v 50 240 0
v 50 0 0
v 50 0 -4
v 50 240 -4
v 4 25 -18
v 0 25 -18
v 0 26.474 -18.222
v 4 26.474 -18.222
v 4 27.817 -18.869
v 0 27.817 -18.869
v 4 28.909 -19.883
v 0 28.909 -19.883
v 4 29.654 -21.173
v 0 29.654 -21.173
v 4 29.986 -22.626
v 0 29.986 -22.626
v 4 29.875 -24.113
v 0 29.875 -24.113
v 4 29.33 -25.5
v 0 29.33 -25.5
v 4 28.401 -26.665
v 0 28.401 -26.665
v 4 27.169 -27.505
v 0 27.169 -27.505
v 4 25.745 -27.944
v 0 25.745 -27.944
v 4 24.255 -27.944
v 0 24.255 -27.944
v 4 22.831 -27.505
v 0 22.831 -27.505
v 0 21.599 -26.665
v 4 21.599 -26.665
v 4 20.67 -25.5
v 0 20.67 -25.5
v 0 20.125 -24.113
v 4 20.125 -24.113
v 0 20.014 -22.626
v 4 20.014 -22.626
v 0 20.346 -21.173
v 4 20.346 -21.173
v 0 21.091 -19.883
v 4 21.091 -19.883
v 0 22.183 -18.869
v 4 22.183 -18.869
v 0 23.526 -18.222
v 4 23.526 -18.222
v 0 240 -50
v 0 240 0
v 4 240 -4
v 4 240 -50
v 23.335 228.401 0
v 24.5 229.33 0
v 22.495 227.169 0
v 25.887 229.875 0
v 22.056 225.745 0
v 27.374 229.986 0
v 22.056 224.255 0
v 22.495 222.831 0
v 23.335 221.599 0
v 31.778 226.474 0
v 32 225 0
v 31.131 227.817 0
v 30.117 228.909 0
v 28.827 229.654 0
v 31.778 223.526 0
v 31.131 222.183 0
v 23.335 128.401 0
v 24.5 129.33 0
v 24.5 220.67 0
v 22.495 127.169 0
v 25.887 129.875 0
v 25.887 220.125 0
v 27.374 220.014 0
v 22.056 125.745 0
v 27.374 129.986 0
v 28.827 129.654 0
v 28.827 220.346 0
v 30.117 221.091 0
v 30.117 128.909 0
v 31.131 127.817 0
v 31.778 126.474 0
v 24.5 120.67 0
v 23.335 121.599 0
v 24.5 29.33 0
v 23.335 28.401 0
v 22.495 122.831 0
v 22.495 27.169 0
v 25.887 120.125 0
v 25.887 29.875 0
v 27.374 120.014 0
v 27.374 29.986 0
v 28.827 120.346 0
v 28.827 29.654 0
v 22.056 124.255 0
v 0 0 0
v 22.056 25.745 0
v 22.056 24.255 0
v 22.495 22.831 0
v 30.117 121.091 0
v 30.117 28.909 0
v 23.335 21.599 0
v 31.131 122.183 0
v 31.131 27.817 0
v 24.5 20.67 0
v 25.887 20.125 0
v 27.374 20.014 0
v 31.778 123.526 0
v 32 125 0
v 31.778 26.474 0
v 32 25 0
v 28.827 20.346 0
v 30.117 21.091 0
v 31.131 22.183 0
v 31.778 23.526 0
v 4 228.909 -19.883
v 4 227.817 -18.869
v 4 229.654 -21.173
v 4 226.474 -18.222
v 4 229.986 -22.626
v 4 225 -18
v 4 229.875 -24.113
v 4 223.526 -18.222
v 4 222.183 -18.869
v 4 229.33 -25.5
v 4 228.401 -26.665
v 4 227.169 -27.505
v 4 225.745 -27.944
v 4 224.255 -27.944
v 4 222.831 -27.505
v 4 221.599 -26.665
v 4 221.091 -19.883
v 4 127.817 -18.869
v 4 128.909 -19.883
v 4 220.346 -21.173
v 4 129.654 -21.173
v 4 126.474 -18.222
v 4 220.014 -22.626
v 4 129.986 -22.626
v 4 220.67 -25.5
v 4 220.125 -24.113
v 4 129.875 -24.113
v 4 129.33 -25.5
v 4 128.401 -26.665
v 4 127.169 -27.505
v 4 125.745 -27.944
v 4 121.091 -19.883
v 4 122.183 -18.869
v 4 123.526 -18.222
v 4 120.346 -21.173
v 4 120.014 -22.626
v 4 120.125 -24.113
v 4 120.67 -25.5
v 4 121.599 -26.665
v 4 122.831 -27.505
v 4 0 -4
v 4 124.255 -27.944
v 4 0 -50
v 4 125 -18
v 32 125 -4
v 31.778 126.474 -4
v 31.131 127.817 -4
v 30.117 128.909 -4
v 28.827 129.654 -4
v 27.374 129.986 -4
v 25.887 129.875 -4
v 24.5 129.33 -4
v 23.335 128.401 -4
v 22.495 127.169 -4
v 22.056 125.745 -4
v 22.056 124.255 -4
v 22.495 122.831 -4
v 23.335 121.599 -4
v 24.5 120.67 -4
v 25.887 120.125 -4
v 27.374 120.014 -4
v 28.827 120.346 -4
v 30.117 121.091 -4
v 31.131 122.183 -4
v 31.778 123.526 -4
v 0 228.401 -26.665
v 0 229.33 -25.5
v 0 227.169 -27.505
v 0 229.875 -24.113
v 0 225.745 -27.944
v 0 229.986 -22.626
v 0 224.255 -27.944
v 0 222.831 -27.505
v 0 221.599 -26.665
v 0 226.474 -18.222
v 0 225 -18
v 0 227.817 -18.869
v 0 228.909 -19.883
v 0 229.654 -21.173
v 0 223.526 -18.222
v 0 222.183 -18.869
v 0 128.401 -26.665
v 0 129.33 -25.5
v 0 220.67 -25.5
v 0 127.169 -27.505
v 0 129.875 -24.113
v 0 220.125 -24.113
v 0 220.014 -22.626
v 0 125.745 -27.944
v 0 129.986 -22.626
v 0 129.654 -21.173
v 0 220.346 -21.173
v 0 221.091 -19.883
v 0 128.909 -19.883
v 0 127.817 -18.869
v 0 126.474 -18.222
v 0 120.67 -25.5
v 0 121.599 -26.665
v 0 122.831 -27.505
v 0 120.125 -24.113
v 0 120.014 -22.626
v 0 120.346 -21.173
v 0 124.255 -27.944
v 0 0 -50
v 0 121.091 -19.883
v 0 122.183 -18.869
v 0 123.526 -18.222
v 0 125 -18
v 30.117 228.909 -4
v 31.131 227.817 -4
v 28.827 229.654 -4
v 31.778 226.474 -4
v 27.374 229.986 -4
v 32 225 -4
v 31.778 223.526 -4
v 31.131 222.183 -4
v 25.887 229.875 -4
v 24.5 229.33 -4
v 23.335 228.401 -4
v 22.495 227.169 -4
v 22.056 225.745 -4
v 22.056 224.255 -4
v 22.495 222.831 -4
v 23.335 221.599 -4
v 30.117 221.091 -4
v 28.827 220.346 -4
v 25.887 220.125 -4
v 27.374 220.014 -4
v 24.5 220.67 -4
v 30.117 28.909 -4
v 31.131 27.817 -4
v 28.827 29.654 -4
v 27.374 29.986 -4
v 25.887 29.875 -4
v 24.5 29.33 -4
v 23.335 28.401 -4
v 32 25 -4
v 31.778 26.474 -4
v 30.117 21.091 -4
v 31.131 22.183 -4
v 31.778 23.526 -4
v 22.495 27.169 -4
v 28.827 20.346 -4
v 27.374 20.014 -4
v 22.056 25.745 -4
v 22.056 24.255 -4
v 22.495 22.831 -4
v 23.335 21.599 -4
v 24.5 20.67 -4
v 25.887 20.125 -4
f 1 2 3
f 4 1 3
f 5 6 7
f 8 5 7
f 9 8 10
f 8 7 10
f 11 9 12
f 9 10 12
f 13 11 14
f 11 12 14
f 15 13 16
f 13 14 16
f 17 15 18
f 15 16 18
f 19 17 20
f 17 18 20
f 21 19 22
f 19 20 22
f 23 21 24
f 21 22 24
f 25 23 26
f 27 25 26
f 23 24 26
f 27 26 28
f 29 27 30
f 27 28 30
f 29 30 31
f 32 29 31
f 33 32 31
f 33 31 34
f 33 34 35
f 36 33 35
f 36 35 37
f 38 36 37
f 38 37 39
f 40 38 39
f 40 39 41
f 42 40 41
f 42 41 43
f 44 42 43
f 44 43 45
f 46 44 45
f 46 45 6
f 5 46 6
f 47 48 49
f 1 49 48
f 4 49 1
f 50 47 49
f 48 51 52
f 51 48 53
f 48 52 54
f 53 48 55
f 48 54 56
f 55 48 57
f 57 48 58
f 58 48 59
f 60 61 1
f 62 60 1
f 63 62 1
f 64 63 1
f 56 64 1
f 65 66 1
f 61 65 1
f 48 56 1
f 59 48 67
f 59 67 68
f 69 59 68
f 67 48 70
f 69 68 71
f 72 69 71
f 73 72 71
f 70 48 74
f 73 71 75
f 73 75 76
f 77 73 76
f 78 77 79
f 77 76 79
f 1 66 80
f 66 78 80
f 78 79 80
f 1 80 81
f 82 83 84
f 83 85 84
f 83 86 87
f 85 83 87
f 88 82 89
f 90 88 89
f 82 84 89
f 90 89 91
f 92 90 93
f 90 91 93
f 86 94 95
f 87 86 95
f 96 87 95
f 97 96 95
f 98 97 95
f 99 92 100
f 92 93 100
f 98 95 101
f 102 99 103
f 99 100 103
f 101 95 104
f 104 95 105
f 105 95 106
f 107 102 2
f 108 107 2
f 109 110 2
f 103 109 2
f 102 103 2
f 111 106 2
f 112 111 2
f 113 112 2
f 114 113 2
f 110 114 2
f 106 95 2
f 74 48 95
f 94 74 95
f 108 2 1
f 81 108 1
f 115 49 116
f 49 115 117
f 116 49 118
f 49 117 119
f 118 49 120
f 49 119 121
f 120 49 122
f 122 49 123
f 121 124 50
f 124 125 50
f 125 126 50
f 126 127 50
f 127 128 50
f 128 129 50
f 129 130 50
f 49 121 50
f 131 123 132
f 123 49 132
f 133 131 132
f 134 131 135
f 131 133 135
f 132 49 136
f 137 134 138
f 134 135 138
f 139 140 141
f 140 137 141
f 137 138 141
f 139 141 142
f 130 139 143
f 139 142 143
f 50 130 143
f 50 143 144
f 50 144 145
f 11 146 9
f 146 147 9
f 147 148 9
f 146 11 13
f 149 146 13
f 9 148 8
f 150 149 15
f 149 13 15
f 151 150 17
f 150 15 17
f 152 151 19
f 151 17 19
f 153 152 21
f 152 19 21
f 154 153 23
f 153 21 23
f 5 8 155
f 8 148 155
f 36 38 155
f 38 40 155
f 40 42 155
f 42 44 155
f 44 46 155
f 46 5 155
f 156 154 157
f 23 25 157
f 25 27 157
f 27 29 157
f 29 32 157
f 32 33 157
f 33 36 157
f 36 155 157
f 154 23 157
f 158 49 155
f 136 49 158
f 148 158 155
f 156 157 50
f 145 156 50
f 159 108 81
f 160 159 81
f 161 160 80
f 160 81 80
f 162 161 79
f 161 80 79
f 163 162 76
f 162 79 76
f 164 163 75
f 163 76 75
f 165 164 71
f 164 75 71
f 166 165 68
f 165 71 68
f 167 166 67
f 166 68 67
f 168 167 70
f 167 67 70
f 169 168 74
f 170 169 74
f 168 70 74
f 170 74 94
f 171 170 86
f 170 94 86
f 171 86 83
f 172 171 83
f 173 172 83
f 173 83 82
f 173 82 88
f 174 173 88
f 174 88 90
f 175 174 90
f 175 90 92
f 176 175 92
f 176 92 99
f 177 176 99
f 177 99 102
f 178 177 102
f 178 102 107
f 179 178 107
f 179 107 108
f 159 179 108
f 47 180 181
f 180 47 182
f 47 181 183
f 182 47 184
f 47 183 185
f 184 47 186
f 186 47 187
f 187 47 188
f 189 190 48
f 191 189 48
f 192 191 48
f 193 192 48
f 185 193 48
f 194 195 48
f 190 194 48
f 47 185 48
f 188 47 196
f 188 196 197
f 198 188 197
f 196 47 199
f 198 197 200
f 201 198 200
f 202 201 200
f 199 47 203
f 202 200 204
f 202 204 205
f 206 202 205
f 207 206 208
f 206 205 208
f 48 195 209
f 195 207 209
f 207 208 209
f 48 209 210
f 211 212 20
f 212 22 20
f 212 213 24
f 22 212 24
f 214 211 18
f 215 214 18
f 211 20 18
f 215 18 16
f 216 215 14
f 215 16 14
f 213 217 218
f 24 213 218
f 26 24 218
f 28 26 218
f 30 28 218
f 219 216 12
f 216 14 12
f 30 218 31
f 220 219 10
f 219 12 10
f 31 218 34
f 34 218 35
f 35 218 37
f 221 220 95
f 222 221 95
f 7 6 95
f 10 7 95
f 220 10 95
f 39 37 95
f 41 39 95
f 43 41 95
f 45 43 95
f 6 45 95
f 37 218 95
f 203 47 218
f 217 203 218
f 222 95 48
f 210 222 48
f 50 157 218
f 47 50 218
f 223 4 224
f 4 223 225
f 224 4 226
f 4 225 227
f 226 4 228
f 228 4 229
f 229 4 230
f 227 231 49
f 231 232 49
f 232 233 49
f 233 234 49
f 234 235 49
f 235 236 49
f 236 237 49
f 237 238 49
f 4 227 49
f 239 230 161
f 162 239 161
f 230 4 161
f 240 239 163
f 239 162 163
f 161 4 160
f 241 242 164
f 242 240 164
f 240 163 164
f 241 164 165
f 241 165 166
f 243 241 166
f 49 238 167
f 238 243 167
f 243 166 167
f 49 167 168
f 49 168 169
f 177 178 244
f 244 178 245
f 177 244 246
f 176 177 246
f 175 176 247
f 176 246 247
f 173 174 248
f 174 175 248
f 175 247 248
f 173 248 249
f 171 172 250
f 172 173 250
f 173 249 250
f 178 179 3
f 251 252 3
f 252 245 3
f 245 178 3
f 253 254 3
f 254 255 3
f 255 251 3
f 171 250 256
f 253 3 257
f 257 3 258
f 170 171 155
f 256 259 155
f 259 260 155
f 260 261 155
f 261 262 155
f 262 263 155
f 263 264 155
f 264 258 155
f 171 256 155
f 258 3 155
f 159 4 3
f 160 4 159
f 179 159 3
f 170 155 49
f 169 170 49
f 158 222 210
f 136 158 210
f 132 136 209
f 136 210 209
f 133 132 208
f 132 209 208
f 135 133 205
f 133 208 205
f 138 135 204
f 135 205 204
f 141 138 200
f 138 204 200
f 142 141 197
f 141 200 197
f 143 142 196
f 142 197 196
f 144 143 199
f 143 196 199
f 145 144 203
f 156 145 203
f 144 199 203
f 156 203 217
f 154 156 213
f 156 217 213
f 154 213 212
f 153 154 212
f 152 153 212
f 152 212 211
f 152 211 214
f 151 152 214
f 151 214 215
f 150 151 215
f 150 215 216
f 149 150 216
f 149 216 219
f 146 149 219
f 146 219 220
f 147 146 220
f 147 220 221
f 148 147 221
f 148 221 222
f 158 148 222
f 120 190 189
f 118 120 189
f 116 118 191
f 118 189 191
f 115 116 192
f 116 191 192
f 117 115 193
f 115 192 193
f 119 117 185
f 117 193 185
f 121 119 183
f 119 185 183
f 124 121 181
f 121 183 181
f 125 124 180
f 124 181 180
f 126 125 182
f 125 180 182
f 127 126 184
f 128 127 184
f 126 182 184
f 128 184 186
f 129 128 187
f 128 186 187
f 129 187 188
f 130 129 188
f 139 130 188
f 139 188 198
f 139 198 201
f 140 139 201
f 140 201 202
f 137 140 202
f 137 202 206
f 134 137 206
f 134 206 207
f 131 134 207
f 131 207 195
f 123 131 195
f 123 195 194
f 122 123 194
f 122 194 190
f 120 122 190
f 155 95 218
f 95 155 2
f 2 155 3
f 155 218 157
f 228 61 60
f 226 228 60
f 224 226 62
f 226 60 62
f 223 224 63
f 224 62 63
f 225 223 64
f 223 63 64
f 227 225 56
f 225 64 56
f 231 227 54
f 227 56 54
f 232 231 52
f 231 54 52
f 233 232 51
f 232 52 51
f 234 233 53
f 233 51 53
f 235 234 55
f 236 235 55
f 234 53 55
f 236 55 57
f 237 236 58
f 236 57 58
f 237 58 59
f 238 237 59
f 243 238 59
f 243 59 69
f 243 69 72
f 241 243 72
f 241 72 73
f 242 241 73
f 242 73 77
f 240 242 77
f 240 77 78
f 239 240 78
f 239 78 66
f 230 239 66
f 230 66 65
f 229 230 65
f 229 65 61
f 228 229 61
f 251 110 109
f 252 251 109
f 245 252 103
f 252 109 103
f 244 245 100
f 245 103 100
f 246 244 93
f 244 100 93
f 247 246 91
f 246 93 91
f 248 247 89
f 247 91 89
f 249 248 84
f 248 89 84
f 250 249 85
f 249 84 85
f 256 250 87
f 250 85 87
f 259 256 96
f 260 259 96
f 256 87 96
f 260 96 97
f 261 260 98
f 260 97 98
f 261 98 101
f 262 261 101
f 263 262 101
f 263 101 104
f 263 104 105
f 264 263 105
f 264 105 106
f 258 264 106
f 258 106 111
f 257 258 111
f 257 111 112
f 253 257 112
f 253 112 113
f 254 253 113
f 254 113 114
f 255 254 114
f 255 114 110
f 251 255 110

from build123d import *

# Parameters (mm, degrees)
EXTRUDE_1_DEPTH     = 240
SKETCH_2_R          = 5
CUT_EXTRUDE_1_DEPTH = 10
SKETCH_3_R          = 5
CUT_EXTRUDE_2_DEPTH = 10


with BuildPart() as part:
    # Эскиз1 → Вытянуть-Тонкостенный1 (new body)
    with BuildSketch(Plane(origin=(0, 0, 0), x_dir=(1, 0, 0), z_dir=(0, 1, 0))):
        Polygon((0, 50), (0, 0), (50, 0), (50, 4), (4, 4), (4, 50), align=None)
    extrude(amount=EXTRUDE_1_DEPTH)

    # Эскиз2 → Вырез-Вытянуть1 (cut)
    with BuildSketch(Plane.XY):
        with Locations((27, 225)):
            Circle(SKETCH_2_R)
        with Locations((27, 125)):
            Circle(SKETCH_2_R)
        with Locations((27, 25)):
            Circle(SKETCH_2_R)
    extrude(amount=-CUT_EXTRUDE_1_DEPTH, mode=Mode.SUBTRACT)

    # Эскиз3 → Вырез-Вытянуть2 (cut)
    with BuildSketch(Plane.ZY):
        with Locations((-23, 225)):
            Circle(SKETCH_3_R)
        with Locations((-23, 125)):
            Circle(SKETCH_3_R)
        with Locations((-23, 25)):
            Circle(SKETCH_3_R)
    extrude(amount=-CUT_EXTRUDE_2_DEPTH, mode=Mode.SUBTRACT)


solid = part.part
